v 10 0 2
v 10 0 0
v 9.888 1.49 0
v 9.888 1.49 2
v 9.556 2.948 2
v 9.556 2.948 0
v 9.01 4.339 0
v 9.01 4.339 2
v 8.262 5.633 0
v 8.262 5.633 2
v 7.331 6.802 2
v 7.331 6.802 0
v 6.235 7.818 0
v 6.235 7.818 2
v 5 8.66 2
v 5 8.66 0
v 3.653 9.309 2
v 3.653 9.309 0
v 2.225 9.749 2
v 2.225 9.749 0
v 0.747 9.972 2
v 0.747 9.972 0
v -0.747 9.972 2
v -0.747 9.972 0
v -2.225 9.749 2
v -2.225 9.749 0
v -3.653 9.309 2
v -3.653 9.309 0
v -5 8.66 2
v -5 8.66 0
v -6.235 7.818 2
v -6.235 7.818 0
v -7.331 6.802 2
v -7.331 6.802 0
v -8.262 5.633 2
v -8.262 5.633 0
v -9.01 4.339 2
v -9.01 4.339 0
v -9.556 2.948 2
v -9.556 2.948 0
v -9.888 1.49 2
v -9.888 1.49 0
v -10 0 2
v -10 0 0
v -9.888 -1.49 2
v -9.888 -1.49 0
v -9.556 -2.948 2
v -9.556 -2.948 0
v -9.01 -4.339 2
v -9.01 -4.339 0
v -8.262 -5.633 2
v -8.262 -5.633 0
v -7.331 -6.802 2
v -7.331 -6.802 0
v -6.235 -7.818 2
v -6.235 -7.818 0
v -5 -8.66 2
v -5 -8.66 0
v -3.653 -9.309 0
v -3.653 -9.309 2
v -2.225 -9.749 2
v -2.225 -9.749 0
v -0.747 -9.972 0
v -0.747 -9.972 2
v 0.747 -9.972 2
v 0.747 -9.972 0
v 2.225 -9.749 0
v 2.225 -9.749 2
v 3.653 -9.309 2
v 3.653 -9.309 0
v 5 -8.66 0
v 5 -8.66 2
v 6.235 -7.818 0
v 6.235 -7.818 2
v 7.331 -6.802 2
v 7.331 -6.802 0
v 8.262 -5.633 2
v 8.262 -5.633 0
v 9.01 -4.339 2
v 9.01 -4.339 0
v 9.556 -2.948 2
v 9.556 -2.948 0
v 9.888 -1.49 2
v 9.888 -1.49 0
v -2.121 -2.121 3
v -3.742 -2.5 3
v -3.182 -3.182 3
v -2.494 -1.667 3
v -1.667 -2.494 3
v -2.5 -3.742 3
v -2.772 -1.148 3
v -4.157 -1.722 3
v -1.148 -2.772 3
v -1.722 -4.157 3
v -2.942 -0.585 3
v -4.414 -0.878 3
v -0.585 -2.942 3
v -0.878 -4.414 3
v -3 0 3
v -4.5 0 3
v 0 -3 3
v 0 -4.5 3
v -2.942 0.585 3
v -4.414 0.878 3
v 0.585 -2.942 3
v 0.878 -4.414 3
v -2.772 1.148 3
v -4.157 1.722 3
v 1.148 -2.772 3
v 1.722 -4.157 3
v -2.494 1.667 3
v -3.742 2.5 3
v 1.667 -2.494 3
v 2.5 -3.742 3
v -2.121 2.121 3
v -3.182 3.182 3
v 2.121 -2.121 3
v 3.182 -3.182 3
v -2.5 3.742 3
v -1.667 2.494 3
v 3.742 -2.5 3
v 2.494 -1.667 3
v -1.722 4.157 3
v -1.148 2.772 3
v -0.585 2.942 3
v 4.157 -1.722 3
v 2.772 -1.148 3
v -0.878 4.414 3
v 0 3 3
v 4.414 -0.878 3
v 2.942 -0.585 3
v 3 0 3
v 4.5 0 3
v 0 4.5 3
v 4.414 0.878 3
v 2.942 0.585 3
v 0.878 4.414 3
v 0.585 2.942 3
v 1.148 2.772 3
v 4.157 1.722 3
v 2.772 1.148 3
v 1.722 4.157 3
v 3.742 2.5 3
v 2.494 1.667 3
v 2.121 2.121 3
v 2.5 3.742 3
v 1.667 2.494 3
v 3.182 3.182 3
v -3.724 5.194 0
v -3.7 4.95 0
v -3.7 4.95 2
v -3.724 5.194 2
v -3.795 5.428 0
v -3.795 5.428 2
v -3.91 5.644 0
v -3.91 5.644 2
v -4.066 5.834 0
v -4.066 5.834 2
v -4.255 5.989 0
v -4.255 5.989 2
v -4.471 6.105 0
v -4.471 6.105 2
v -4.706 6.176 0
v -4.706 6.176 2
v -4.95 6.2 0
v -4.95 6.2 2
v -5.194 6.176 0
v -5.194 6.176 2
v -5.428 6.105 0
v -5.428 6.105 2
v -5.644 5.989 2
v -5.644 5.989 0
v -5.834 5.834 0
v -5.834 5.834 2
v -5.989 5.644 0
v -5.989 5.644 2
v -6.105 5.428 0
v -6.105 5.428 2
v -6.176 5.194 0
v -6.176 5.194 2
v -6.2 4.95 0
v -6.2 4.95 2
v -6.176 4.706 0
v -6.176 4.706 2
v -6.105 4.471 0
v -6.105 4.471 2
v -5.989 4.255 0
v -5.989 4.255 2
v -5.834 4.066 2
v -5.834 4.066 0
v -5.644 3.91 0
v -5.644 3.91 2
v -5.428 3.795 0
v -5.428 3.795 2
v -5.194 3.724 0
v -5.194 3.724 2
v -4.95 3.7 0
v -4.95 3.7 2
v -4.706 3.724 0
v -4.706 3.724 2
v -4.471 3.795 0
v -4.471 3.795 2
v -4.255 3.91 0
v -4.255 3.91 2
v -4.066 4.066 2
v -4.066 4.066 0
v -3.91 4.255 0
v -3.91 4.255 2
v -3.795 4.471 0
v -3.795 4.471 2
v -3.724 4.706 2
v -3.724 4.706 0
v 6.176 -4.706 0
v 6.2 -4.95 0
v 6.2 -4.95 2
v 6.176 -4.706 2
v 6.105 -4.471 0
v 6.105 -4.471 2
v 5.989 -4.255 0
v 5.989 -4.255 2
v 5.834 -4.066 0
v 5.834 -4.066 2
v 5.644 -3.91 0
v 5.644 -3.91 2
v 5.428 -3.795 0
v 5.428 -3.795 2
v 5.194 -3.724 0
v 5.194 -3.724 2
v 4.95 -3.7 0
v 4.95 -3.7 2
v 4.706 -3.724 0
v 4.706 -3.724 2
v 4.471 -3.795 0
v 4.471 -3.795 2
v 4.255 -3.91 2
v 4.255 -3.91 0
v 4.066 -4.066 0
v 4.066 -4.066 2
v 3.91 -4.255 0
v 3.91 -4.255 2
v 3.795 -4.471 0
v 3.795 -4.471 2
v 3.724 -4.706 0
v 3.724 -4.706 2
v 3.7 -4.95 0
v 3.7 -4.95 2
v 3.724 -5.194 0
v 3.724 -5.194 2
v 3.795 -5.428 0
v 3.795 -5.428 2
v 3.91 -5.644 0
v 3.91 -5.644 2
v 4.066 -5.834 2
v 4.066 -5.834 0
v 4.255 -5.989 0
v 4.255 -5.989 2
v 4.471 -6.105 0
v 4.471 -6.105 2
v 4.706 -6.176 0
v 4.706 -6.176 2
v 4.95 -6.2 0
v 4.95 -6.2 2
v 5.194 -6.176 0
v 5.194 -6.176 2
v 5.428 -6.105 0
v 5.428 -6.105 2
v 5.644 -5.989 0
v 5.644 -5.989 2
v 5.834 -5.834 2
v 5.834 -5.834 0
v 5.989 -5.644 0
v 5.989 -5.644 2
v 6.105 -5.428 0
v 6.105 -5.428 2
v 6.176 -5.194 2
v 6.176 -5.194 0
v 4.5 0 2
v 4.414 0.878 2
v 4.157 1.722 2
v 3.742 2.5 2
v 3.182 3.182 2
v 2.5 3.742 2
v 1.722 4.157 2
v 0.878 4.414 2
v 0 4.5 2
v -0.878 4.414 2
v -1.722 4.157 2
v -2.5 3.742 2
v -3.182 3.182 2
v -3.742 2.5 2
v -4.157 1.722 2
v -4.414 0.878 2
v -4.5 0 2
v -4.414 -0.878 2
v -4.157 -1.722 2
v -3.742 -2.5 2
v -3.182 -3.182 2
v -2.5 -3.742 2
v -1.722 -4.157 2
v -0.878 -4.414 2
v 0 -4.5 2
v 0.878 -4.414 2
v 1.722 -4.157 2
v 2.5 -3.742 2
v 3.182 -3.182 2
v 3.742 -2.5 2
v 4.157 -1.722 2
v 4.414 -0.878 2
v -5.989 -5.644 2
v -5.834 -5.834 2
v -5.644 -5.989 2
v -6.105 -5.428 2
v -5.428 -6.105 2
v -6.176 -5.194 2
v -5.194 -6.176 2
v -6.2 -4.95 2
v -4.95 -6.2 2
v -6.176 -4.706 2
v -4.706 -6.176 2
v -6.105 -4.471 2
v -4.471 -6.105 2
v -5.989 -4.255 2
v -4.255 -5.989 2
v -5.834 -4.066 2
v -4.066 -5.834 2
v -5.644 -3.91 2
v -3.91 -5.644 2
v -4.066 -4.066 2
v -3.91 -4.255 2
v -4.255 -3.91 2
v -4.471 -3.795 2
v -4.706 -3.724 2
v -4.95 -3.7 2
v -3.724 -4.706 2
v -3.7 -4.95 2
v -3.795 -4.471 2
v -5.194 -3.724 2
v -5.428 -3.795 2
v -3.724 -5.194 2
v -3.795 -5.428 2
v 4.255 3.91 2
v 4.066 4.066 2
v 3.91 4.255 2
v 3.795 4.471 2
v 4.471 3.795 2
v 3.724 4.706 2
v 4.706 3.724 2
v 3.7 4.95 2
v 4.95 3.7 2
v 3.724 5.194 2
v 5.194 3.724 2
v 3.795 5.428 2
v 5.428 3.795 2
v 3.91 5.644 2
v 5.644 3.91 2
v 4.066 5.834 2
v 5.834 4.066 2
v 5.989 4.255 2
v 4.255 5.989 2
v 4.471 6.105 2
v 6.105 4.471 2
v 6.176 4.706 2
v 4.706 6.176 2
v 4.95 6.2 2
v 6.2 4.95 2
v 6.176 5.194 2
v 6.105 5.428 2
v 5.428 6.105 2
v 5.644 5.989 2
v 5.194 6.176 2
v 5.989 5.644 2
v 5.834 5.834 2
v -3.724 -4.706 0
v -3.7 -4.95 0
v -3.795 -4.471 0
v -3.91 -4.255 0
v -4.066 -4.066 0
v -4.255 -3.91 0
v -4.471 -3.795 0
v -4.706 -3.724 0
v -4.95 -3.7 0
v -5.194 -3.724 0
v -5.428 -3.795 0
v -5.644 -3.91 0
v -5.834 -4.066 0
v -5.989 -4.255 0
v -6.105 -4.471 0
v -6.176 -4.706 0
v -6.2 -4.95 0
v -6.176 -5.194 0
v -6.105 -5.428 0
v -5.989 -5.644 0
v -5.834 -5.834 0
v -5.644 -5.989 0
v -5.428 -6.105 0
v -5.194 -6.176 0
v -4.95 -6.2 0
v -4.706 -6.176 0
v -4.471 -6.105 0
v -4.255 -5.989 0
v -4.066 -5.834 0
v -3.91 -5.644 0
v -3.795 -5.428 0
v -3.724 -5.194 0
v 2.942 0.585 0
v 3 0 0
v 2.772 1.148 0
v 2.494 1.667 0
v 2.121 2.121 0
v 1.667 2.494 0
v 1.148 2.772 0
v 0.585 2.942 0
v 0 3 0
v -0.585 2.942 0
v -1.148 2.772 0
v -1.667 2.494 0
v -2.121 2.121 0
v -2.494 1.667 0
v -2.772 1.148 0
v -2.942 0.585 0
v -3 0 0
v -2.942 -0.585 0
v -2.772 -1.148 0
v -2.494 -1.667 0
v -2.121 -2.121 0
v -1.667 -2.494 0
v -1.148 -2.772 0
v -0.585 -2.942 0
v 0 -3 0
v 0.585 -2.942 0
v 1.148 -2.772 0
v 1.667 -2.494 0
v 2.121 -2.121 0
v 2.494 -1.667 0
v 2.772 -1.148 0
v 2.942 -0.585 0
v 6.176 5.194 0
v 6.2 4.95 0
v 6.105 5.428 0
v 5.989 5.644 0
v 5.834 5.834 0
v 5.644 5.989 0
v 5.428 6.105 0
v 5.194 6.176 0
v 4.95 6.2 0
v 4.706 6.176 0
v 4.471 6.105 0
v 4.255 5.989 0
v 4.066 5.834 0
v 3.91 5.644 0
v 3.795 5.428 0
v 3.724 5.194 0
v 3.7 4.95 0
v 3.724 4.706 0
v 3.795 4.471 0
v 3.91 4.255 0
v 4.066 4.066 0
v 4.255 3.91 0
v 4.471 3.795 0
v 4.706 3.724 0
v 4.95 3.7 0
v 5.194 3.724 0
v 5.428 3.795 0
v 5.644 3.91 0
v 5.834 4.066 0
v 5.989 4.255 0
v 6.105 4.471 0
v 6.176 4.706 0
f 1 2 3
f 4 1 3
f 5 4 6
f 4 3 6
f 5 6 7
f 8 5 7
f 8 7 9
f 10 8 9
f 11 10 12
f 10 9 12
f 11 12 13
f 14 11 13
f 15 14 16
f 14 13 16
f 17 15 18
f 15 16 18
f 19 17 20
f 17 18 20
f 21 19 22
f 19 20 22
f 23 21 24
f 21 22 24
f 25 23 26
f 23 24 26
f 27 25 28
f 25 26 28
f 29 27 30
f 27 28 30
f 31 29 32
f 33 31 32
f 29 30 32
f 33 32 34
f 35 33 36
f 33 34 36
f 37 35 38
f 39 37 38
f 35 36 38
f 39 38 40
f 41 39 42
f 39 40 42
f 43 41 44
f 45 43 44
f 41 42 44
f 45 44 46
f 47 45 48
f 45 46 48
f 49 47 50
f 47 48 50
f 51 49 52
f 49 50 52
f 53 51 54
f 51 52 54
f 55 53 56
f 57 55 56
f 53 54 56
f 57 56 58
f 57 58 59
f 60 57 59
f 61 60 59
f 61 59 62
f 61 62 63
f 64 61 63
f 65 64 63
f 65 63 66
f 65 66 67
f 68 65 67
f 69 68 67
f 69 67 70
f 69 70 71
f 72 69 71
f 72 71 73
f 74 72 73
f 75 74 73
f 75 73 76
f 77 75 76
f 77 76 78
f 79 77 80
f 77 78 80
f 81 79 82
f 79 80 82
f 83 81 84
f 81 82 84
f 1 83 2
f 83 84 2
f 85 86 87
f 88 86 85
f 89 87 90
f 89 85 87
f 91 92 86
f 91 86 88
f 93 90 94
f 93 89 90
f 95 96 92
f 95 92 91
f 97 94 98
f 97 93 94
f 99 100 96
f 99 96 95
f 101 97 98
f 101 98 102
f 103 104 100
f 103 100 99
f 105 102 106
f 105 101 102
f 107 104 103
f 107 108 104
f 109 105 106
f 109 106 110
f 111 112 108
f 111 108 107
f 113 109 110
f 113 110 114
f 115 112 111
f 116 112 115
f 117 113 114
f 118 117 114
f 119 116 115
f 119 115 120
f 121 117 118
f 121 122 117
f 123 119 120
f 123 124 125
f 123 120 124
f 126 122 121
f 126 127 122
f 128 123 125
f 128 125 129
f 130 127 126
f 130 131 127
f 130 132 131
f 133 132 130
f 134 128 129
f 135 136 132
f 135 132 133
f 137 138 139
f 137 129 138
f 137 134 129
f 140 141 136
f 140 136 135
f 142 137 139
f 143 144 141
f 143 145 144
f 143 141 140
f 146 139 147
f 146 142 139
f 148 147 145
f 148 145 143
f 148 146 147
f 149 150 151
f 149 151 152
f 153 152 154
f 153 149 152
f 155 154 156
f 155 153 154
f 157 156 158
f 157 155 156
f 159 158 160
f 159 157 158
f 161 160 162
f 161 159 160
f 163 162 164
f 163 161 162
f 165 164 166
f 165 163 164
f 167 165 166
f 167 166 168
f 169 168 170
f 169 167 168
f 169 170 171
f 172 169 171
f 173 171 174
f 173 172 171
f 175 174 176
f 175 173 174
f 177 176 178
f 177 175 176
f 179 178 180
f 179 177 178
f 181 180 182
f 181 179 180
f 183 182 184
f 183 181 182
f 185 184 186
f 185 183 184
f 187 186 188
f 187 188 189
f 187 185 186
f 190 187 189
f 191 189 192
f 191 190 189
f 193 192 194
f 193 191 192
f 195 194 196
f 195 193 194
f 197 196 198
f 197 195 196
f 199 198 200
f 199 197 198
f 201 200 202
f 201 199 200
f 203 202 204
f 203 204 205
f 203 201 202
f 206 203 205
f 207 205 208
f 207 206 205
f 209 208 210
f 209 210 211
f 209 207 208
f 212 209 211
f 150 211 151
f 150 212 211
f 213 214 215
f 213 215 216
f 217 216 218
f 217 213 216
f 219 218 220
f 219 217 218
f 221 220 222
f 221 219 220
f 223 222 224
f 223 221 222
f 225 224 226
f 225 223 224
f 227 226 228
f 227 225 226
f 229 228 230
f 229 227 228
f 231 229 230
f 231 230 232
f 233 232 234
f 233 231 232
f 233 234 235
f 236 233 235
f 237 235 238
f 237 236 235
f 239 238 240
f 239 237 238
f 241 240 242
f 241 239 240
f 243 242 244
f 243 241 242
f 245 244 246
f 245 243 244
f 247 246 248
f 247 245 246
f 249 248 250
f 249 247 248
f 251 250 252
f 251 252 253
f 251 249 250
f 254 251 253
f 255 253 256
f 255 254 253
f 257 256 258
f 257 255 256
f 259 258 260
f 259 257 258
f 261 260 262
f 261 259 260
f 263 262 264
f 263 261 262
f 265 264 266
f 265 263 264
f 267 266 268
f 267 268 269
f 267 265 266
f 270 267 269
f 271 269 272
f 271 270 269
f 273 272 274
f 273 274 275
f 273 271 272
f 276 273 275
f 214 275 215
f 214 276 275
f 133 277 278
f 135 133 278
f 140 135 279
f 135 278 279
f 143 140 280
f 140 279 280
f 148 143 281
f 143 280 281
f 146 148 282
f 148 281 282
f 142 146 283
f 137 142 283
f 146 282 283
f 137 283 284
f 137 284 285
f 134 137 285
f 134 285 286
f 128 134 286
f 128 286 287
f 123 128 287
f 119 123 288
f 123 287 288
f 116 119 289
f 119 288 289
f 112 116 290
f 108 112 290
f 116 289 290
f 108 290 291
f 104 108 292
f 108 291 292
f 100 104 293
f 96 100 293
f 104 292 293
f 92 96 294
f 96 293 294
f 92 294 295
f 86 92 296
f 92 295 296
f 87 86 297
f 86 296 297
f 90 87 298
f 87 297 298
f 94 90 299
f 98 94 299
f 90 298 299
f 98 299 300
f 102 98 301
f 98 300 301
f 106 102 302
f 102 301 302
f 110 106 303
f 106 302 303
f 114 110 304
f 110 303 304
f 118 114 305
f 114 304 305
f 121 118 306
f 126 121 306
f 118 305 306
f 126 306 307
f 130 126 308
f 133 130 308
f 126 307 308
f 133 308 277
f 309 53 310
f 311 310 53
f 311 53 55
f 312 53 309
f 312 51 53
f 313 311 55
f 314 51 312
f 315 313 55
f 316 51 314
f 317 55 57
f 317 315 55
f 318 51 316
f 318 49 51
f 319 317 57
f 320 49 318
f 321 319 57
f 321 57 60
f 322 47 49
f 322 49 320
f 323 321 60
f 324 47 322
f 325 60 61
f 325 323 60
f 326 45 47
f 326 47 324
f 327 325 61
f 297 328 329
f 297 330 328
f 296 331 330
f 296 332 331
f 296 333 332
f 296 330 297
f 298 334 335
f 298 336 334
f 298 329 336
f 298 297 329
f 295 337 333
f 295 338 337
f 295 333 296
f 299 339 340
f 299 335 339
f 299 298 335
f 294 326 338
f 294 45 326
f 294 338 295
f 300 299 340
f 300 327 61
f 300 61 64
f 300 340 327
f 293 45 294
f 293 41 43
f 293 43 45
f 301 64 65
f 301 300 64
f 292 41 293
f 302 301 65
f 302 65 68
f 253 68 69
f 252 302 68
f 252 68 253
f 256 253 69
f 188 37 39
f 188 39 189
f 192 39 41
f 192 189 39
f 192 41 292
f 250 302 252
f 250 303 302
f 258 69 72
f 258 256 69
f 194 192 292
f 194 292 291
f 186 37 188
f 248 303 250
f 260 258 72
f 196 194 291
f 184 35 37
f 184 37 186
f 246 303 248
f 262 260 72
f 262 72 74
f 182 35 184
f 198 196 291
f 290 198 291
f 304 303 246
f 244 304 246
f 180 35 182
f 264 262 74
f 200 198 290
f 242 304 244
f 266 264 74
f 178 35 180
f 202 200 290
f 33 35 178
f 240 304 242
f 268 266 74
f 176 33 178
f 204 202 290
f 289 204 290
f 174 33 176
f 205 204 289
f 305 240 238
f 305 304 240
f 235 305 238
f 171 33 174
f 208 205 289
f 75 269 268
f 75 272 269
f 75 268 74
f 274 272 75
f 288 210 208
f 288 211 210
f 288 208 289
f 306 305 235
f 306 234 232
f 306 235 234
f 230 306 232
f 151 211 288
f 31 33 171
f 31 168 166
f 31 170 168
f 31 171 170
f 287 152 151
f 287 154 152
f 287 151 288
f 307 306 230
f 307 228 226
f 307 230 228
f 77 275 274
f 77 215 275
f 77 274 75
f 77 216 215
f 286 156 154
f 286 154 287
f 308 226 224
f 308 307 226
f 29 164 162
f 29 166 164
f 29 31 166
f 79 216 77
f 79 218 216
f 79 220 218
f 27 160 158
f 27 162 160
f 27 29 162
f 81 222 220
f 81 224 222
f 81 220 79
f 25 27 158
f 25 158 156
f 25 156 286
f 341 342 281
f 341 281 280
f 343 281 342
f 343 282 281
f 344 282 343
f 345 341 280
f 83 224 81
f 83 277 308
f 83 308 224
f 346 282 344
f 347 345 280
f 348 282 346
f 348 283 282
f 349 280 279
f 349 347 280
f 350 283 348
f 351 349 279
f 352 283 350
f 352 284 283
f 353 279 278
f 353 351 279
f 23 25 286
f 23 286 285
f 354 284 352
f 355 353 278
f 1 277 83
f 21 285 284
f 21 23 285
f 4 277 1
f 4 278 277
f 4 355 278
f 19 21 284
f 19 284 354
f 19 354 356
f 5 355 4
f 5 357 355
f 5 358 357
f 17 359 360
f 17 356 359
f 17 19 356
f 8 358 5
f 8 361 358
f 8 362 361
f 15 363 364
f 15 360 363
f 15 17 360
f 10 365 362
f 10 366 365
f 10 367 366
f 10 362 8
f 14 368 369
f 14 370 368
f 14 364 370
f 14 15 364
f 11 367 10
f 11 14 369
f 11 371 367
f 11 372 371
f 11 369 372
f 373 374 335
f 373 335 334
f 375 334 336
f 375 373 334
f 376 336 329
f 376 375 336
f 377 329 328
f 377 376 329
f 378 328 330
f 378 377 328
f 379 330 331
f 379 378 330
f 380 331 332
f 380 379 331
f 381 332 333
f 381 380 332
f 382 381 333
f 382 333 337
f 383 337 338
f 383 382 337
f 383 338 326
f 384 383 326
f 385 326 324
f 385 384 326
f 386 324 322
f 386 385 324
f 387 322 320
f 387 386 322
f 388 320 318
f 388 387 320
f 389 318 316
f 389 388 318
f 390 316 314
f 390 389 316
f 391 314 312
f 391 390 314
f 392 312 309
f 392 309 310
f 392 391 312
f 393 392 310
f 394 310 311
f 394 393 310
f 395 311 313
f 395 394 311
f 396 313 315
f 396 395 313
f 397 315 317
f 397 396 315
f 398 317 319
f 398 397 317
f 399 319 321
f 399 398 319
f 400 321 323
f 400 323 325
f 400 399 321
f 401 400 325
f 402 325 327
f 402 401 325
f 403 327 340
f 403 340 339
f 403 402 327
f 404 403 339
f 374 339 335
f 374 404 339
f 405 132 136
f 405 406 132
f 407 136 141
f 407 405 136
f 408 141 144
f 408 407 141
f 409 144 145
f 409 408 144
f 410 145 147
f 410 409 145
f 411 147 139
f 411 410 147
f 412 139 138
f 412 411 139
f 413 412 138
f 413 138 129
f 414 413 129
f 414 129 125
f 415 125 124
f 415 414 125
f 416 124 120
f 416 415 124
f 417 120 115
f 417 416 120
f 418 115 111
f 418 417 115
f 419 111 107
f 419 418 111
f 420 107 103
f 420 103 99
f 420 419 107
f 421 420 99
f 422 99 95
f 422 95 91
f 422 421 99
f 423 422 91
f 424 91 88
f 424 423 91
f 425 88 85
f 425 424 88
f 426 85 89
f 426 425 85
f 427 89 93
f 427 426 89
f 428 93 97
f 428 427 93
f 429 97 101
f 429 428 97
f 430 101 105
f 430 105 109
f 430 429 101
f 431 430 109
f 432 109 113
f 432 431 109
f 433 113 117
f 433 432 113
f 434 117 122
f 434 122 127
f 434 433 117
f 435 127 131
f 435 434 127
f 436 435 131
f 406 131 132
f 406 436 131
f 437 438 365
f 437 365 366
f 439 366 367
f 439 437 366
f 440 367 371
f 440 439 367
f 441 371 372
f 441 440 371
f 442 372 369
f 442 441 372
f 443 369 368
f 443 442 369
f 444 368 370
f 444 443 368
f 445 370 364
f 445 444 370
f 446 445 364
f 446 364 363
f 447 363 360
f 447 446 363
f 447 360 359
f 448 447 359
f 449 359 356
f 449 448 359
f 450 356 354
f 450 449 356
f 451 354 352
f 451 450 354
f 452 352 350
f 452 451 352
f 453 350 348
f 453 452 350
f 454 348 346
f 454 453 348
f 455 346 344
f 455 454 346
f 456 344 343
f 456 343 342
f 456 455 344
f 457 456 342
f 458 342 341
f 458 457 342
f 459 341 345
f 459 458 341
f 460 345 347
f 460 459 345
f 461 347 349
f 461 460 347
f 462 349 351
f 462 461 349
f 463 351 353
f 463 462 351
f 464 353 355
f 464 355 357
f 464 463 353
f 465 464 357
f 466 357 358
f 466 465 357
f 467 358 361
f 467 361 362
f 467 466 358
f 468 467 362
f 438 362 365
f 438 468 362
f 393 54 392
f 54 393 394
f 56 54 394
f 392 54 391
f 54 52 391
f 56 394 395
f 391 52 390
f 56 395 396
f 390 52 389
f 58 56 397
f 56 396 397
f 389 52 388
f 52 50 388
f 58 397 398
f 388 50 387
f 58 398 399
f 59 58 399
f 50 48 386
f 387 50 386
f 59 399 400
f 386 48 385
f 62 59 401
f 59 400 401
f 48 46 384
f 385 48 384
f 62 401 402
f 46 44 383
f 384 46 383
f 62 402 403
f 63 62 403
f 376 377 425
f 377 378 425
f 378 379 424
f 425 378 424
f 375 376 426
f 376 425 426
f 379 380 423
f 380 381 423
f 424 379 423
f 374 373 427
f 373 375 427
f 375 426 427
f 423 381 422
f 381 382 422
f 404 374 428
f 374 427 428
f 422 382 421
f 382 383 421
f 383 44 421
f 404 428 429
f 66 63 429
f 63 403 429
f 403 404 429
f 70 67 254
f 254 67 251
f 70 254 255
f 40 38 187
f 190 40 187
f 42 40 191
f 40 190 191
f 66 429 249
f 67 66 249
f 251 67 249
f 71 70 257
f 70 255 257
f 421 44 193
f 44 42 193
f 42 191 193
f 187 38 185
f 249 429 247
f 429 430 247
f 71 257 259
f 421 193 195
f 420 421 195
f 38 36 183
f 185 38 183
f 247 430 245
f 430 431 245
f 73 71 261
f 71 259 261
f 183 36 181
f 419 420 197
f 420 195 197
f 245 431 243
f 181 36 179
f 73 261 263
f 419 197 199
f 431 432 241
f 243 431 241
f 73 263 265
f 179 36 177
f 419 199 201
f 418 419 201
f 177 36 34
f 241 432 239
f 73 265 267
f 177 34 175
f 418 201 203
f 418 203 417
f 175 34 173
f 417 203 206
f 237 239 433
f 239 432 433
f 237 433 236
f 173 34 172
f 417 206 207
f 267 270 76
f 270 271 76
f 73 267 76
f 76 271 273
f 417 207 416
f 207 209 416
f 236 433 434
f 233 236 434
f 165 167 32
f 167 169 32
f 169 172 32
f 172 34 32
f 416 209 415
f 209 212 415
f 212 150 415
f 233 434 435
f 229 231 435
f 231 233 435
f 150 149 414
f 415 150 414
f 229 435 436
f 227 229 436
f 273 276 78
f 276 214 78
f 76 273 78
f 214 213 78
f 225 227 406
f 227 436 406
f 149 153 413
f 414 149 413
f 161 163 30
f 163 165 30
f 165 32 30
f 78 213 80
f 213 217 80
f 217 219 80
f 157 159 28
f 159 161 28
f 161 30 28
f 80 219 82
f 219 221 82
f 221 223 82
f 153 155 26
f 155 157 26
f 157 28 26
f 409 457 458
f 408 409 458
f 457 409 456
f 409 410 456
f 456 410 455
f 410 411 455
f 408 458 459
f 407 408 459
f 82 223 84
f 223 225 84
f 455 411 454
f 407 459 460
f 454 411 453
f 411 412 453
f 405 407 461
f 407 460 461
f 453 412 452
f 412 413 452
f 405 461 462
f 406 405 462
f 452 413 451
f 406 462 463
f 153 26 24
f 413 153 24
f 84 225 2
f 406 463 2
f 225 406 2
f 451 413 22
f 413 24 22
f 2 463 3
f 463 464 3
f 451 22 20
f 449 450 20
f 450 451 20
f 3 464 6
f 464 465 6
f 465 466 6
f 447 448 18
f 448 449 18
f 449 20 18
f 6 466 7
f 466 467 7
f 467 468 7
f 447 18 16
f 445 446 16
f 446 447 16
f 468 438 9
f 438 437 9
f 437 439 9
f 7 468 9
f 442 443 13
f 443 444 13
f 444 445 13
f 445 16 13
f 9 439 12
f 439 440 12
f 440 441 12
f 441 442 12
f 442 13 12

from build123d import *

# Parameters (mm, degrees)
SKETCH_1_R      = 10
SKETCH_1_R_2    = 1.25
SKETCH_1_R_3    = 3
EXTRUDE_1_DEPTH = 2
SKETCH_2_R      = 4.5
SKETCH_2_R_2    = 3
EXTRUDE_2_DEPTH = 1


with BuildPart() as part:
    # 草图1 → 凸台-拉伸1 (new body)
    with BuildSketch(Plane.XY):
        Circle(SKETCH_1_R)
        with Locations((-4.949747468, 4.949747468)):
            Circle(SKETCH_1_R_2, mode=Mode.SUBTRACT)
        with Locations((4.949747468, 4.949747468)):
            Circle(SKETCH_1_R_2, mode=Mode.SUBTRACT)
        with Locations((4.949747468, -4.949747468)):
            Circle(SKETCH_1_R_2, mode=Mode.SUBTRACT)
        with Locations((-4.949747468, -4.949747468)):
            Circle(SKETCH_1_R_2, mode=Mode.SUBTRACT)
        Circle(SKETCH_1_R_3, mode=Mode.SUBTRACT)
    extrude(amount=EXTRUDE_1_DEPTH)

    # 草图2 → 凸台-拉伸2 (add)
    with BuildSketch(Plane.XY.offset(2)):
        Circle(SKETCH_2_R)
        Circle(SKETCH_2_R_2, mode=Mode.SUBTRACT)
    extrude(amount=EXTRUDE_2_DEPTH)


solid = part.part
